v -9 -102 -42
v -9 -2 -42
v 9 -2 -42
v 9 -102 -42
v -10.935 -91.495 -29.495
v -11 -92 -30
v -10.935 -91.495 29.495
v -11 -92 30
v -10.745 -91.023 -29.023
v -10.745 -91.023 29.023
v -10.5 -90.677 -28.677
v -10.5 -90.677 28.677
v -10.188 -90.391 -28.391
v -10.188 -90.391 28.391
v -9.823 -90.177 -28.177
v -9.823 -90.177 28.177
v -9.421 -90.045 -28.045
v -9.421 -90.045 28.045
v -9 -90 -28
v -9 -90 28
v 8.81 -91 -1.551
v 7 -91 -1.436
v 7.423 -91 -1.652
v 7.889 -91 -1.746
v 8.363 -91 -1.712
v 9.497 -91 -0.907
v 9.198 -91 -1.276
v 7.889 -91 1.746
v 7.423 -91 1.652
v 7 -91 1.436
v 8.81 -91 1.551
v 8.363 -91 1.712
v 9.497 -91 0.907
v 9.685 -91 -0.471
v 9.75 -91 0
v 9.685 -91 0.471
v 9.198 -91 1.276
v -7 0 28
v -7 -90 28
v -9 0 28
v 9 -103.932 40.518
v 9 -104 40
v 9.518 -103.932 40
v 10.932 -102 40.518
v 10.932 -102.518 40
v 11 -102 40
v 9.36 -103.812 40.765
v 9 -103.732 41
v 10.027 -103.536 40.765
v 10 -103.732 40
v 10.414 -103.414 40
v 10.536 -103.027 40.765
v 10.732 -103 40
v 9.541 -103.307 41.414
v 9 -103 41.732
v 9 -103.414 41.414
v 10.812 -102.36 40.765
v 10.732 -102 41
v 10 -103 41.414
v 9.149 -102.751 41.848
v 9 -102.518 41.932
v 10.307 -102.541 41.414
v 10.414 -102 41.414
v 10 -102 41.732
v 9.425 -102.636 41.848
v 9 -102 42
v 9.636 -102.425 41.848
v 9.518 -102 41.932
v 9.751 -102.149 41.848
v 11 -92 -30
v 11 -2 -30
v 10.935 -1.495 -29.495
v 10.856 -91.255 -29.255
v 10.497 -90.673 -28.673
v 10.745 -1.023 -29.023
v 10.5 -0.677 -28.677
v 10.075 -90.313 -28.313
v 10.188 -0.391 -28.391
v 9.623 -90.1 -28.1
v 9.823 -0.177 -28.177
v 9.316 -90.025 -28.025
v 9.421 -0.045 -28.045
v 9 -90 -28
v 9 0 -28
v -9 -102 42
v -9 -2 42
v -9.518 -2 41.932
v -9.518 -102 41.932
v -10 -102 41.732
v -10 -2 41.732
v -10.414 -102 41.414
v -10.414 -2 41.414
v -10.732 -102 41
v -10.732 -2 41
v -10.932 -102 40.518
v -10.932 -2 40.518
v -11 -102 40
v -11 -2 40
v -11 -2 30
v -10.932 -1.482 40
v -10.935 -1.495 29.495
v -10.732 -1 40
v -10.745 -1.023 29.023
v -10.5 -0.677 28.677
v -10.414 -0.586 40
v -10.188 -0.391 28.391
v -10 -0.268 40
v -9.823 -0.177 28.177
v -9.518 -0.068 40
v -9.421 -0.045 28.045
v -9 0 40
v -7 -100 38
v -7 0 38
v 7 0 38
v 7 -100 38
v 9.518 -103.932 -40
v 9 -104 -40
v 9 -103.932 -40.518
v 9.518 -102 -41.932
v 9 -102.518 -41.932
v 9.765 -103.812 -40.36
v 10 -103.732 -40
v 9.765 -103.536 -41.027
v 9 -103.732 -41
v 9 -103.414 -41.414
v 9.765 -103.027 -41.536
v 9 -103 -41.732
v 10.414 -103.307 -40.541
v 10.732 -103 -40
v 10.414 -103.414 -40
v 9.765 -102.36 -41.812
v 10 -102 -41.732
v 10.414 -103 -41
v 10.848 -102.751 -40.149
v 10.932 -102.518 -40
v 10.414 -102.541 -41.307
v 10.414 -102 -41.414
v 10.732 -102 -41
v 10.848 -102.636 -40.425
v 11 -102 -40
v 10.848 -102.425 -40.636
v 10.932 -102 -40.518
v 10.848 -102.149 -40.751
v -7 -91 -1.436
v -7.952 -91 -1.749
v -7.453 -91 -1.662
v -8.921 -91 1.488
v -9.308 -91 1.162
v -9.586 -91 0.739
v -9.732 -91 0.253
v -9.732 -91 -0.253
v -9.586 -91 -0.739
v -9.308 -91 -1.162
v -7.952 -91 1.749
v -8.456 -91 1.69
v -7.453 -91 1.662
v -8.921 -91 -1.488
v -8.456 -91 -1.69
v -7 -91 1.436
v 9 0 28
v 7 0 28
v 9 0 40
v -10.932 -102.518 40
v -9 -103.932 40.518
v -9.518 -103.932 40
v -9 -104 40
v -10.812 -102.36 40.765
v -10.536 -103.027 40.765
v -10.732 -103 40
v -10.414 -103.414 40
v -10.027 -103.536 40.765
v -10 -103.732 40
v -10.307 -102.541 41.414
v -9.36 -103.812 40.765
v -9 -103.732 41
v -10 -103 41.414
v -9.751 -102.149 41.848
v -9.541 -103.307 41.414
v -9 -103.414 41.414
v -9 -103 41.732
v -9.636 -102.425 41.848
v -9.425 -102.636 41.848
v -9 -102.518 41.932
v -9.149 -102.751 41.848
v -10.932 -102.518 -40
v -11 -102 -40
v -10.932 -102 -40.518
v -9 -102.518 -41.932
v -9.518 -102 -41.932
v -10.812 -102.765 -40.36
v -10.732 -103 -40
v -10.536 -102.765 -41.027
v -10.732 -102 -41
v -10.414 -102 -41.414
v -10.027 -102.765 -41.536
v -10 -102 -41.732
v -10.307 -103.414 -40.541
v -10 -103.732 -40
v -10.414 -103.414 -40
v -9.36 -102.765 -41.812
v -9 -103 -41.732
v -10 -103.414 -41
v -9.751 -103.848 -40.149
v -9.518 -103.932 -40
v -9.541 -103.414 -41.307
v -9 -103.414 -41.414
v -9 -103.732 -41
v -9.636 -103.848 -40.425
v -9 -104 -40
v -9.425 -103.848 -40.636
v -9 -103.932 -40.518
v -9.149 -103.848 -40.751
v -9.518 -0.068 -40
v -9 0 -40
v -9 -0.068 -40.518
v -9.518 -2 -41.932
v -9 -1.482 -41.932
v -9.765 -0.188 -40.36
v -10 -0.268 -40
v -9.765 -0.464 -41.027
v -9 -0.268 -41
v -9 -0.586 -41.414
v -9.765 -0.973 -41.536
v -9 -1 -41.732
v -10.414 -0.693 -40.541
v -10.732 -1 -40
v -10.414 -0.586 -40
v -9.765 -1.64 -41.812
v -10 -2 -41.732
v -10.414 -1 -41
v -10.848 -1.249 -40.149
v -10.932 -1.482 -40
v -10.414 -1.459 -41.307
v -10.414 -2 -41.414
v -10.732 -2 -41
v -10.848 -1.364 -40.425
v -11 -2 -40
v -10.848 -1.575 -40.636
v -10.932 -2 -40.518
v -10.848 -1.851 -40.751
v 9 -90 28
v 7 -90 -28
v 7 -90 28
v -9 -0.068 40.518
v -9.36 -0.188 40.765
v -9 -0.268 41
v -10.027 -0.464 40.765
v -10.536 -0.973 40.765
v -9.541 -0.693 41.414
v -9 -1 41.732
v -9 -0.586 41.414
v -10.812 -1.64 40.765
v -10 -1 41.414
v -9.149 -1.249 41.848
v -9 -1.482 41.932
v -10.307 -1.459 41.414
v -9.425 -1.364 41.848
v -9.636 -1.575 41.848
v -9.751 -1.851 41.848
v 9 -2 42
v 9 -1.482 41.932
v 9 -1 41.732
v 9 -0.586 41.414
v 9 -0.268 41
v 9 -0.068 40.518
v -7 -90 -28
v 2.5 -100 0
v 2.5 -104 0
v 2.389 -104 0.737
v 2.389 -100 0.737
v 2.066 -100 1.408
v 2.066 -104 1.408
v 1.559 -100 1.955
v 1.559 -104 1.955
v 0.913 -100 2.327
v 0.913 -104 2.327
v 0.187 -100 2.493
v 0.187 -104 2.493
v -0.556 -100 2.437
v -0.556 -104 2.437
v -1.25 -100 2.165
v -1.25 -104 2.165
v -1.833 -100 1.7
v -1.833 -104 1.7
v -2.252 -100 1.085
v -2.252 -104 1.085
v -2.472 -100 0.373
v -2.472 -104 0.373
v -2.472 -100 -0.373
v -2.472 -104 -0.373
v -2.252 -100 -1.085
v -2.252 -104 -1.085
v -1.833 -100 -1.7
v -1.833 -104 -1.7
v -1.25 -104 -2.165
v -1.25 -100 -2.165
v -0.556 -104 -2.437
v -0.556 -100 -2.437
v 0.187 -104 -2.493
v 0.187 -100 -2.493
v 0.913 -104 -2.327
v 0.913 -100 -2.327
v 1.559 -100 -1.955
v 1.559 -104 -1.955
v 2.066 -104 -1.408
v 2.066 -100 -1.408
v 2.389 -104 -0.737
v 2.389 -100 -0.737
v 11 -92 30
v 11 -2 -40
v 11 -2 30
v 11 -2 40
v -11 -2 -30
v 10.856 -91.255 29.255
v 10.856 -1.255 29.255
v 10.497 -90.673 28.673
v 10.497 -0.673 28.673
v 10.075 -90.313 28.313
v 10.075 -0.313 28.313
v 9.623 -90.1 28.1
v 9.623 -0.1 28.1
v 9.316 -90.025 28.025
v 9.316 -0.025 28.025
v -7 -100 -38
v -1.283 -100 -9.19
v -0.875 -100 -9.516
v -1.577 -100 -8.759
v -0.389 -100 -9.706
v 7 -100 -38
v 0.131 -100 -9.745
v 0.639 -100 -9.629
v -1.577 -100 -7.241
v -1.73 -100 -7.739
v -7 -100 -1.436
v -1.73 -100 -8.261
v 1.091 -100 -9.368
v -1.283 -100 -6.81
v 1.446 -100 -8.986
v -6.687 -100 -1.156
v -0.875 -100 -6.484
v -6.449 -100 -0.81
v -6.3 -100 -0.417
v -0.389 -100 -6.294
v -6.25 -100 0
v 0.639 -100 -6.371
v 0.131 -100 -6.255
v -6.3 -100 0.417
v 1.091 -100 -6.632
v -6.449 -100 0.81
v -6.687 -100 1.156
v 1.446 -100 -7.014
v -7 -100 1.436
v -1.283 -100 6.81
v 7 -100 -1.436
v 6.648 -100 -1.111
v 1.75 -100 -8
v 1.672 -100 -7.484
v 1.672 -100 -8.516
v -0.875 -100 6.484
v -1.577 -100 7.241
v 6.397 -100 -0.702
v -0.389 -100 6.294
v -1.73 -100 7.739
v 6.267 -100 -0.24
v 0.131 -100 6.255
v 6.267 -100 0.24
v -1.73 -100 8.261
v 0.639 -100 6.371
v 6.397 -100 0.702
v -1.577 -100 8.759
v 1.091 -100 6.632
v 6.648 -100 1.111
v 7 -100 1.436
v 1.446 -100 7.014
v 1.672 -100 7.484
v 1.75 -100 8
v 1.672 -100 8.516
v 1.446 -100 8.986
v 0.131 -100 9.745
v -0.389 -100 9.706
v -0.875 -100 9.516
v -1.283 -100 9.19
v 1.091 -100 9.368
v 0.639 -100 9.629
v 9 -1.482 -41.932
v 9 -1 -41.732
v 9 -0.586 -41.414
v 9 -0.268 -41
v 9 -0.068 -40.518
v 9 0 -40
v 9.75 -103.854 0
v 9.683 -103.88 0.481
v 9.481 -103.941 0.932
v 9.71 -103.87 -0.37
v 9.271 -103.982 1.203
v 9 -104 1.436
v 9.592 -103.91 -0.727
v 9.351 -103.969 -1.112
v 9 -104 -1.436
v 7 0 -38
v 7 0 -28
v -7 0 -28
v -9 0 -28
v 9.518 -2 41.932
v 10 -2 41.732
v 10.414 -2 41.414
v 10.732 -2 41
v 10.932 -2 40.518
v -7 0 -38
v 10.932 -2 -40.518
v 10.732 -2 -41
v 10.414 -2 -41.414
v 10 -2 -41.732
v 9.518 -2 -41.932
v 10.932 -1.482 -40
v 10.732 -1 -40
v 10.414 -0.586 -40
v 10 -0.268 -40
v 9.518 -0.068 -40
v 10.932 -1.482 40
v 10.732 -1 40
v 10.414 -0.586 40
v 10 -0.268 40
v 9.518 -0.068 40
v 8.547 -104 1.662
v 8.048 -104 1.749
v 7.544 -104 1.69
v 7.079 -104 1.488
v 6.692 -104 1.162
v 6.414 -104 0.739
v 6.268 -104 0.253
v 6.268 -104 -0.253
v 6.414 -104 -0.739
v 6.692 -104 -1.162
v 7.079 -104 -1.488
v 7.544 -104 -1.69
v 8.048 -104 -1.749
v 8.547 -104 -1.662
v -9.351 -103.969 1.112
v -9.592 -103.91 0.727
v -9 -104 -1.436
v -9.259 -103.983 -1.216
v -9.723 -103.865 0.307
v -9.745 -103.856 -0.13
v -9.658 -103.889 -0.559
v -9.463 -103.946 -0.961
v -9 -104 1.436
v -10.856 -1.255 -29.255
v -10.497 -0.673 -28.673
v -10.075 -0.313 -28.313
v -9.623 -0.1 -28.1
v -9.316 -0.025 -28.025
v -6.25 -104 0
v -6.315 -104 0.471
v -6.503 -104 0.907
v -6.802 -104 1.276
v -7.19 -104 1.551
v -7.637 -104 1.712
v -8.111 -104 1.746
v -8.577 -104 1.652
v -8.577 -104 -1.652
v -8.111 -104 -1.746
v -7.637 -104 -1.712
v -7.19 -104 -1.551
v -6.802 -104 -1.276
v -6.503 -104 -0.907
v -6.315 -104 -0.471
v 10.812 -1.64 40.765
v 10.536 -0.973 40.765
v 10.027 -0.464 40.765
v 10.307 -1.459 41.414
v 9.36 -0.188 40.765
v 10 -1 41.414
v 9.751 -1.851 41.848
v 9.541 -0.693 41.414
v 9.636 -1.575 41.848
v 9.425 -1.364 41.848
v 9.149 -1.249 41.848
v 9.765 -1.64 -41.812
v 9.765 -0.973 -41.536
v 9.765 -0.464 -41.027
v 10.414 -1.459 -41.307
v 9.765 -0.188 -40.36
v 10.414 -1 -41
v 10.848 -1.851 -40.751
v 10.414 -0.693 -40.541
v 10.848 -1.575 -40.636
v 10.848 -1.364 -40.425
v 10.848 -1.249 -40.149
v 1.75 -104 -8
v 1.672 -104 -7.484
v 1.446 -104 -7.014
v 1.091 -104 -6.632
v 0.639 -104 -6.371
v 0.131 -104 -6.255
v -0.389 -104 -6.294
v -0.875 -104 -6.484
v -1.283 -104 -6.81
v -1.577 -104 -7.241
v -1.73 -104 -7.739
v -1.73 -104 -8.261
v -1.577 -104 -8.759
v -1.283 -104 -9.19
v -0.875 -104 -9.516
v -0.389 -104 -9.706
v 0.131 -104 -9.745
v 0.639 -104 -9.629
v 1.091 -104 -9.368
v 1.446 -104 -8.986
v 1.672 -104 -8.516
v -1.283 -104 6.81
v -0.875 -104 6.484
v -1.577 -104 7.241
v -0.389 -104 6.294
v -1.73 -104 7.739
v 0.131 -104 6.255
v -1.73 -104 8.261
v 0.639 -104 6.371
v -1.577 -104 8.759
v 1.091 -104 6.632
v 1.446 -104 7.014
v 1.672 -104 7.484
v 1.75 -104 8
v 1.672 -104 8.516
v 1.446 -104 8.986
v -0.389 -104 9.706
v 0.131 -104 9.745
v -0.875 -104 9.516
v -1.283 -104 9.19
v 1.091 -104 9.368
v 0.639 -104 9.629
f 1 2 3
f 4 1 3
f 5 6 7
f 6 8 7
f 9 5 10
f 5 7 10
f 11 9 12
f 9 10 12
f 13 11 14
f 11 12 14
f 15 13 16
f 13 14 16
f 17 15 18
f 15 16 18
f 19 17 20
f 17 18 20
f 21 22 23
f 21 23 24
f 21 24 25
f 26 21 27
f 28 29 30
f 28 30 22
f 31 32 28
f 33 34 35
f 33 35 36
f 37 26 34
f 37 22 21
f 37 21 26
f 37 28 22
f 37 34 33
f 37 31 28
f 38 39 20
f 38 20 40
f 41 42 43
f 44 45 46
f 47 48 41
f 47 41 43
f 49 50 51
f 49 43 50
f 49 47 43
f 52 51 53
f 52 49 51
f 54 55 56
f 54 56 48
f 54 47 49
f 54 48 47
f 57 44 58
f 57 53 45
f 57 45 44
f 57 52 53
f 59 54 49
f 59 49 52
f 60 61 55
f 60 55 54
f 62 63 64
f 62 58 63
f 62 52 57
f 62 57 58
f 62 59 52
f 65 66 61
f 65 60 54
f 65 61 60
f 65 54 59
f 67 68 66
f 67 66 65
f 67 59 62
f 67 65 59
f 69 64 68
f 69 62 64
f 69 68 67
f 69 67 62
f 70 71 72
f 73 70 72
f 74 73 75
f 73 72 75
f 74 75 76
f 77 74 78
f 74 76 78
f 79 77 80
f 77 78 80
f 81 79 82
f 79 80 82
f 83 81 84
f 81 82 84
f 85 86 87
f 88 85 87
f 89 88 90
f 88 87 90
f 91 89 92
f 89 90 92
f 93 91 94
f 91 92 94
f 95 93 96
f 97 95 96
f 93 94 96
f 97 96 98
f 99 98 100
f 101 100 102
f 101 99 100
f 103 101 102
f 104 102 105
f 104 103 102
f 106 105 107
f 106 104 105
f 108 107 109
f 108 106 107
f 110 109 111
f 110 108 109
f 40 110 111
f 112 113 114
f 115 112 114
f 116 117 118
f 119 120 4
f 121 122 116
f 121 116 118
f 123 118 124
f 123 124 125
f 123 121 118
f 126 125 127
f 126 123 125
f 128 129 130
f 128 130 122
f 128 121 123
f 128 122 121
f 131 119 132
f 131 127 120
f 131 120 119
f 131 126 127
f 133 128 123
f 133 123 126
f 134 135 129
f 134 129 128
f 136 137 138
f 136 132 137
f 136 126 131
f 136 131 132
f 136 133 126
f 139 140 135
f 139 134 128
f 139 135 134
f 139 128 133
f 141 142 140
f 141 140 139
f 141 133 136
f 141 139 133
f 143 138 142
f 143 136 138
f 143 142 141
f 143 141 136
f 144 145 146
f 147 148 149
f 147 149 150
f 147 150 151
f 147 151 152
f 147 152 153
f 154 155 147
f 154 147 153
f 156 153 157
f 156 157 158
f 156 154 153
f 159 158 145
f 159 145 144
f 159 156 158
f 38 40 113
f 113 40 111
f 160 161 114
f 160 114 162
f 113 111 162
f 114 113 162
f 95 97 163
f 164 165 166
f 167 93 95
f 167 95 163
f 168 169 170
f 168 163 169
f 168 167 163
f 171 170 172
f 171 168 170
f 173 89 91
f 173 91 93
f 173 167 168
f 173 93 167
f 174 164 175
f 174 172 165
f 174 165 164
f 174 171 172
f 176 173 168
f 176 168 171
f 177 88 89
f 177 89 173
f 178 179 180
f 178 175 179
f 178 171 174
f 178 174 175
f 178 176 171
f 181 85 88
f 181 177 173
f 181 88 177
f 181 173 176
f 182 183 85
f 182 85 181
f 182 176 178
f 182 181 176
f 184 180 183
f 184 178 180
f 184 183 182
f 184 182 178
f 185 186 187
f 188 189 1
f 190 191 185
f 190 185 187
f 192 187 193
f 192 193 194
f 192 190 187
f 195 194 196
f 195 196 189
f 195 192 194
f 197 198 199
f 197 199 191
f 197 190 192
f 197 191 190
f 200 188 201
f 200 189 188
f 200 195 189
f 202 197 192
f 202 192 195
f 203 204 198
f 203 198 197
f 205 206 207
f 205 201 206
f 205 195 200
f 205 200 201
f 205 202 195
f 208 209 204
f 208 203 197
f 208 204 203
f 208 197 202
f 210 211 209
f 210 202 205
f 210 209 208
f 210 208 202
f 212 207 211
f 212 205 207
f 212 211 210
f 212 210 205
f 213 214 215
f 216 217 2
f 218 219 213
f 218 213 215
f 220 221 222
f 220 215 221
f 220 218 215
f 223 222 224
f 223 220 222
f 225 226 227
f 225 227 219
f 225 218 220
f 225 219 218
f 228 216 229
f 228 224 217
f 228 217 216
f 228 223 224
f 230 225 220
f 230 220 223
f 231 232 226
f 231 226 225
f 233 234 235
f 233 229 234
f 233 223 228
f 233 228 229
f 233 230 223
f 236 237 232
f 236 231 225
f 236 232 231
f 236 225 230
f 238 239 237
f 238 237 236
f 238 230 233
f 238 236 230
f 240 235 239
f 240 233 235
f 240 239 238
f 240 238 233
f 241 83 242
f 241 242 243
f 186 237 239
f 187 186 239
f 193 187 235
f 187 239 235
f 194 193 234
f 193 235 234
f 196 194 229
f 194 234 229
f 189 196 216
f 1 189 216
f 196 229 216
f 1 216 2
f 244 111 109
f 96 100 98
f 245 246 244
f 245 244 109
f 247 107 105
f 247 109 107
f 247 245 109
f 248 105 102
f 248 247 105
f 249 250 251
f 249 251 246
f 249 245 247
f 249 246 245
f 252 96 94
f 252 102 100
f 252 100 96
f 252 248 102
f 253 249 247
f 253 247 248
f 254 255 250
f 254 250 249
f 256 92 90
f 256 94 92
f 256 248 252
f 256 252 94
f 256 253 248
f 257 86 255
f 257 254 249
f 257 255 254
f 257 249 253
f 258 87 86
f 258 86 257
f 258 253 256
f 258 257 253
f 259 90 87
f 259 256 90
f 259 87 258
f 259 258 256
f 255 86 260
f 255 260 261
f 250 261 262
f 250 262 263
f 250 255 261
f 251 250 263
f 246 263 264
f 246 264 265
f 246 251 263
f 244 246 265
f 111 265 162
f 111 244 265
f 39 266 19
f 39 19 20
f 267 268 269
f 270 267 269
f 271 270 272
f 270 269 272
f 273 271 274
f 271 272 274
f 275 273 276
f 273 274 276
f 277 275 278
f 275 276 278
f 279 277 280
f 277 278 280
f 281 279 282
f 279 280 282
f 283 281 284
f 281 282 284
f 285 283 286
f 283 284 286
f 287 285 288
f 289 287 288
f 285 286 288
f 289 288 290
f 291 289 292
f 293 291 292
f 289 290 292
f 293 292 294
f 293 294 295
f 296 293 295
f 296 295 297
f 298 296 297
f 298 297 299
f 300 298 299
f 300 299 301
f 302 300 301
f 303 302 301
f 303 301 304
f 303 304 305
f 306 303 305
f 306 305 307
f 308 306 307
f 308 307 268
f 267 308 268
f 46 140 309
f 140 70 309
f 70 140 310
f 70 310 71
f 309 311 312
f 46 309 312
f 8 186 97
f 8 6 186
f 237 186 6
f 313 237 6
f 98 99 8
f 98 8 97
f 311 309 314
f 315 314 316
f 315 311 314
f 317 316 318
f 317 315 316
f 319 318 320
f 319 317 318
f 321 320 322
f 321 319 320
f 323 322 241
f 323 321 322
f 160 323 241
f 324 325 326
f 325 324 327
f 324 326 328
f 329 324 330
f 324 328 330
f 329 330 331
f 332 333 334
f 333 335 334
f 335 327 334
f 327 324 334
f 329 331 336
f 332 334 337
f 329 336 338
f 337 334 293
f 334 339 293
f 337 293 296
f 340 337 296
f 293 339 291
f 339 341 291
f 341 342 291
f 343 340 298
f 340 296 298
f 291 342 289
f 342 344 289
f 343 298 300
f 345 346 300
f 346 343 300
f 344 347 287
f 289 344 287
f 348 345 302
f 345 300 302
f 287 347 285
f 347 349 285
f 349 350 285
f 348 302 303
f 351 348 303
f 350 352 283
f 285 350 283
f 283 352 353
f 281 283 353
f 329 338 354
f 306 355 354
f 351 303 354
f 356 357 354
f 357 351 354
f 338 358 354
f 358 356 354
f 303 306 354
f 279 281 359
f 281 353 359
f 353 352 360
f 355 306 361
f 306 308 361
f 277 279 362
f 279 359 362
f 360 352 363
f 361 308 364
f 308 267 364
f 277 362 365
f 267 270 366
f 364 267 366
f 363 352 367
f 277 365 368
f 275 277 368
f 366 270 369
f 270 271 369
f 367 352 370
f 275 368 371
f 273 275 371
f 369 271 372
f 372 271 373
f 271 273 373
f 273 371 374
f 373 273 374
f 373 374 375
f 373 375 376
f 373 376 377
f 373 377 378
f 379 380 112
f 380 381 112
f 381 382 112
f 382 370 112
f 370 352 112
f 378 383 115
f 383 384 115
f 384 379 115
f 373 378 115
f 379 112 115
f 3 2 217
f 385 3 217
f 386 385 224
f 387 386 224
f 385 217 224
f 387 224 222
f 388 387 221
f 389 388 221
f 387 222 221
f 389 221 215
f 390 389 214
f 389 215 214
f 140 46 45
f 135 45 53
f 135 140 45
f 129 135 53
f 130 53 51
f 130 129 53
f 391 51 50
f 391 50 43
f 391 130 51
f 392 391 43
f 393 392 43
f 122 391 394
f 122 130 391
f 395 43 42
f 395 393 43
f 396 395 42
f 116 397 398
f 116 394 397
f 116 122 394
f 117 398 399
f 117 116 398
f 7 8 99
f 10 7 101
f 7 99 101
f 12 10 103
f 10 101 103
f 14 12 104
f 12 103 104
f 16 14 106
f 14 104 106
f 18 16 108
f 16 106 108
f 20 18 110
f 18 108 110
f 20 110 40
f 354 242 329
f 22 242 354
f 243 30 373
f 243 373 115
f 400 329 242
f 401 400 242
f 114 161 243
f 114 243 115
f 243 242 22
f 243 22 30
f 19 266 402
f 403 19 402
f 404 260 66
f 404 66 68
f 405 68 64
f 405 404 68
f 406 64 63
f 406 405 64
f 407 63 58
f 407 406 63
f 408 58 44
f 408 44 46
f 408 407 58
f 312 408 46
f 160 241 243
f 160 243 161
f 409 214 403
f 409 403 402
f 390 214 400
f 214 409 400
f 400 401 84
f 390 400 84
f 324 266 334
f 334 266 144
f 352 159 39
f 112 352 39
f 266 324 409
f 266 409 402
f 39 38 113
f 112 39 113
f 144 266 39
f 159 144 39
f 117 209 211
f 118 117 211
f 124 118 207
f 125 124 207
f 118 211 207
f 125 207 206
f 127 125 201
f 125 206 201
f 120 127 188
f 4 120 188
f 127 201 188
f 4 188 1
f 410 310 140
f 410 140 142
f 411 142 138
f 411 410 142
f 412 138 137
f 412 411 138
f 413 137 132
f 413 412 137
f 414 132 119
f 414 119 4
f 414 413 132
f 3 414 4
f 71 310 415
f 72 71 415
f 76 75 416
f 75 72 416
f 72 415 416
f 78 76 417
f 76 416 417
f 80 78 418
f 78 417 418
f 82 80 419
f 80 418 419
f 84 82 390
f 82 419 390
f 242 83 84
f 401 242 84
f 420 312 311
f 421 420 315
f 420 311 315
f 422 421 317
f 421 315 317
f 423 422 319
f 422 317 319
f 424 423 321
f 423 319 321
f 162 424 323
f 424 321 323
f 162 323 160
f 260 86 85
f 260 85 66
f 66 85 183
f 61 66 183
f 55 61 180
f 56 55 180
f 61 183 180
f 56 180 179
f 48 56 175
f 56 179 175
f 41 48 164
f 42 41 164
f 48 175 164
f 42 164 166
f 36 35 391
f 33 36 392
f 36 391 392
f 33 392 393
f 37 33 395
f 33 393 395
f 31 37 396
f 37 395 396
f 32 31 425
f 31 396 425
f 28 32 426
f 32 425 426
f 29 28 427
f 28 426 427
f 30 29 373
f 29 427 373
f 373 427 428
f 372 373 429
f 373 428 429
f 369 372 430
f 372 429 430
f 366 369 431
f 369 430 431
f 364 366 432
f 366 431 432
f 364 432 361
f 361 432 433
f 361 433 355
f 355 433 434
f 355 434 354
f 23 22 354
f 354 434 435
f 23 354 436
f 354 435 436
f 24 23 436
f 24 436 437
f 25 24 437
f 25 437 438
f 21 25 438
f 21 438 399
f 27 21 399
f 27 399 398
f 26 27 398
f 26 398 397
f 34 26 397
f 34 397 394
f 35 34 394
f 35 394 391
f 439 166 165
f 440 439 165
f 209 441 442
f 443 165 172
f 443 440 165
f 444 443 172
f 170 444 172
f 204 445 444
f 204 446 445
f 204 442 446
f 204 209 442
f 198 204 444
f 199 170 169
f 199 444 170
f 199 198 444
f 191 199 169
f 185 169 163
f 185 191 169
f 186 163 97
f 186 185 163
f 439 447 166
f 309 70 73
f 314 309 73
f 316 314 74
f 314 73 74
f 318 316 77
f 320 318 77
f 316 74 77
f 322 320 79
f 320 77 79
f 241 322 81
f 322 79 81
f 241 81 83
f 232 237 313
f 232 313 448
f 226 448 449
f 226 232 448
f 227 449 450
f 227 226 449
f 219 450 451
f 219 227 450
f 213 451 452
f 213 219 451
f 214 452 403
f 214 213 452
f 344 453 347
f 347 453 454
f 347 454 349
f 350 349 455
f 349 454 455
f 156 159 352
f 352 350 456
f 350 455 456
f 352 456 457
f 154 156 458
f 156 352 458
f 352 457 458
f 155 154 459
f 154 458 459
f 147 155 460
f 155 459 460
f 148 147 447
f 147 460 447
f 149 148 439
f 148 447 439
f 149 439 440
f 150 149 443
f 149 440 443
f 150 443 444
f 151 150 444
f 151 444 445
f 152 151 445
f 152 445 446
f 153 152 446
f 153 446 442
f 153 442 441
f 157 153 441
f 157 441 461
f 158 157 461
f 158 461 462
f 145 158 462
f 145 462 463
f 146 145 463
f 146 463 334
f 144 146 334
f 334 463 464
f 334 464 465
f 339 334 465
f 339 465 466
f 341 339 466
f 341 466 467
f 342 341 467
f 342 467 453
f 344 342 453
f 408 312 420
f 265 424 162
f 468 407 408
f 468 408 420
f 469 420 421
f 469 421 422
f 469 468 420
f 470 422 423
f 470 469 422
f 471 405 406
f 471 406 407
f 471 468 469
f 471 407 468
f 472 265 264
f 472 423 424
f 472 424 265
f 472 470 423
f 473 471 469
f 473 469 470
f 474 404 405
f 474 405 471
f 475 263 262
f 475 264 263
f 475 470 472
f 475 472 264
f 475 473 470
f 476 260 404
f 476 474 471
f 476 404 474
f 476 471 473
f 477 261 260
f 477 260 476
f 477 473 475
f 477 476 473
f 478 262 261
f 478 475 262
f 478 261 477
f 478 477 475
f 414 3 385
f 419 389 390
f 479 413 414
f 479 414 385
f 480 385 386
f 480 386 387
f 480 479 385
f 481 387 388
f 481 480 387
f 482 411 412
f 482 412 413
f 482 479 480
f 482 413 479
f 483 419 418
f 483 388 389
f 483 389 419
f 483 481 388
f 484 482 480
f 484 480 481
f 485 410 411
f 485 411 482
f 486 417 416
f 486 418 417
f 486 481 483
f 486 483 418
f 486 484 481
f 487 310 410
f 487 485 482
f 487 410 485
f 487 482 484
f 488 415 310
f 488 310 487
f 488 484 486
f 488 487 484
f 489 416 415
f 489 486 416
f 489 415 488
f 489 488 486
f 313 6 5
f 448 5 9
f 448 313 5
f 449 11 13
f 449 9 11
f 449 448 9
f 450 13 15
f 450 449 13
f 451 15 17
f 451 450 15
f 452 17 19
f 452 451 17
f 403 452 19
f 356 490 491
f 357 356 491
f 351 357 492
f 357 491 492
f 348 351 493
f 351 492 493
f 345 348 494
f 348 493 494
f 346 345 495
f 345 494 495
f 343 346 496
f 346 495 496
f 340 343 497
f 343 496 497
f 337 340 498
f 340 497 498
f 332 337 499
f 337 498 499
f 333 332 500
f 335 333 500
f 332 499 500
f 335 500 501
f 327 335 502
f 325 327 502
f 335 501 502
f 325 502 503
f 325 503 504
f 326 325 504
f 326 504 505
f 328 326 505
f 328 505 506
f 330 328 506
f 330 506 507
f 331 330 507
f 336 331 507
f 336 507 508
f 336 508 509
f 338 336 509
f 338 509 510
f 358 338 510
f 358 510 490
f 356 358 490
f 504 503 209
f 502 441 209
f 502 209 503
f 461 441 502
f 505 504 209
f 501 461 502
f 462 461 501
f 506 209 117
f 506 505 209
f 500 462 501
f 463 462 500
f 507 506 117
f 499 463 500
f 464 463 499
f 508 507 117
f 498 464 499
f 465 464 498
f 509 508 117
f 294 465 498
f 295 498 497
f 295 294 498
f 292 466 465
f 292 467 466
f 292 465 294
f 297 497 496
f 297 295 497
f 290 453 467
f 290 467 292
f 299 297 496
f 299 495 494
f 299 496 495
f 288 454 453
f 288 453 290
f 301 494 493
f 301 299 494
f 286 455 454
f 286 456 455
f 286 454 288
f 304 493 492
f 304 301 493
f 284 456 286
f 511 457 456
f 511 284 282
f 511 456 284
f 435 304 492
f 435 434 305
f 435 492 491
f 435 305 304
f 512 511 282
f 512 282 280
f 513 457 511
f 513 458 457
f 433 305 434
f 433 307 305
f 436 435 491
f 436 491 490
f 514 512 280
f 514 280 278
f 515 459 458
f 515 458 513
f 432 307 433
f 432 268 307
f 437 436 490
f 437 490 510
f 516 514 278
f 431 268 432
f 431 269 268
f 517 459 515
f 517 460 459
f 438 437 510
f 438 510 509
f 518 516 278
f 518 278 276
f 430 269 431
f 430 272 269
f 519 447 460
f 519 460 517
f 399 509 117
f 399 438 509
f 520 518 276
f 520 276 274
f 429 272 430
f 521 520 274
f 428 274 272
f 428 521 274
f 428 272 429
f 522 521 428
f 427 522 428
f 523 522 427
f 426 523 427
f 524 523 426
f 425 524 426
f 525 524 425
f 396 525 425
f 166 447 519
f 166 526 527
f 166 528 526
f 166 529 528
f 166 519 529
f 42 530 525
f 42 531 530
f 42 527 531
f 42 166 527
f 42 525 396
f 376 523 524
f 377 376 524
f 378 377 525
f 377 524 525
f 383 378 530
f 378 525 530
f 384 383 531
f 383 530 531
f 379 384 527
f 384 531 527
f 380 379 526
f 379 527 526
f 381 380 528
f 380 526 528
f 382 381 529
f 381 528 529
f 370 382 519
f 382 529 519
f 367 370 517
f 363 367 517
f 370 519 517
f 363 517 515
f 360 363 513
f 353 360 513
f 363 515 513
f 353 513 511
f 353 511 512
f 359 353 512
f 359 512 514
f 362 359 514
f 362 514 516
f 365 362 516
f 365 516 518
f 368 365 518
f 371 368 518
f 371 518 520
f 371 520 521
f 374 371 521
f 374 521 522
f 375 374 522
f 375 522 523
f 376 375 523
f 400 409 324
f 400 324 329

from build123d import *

# Parameters (mm, degrees)
F0_W          = 22
F0_H          = 84
F0_W_2        = 14
F0_H_2        = 76
F1_DEPTH      = 100
F2_W          = 22
F2_H          = 84
F3_DEPTH      = 4
F4_R          = 2.5
F4_R_2        = 1.75
F5_DEPTH      = 13
F6_W          = 90
F6_H          = 56
F7_DEPTH      = 22.001
F8_T1_DEPTH   = 100
F8_T3_DEPTH   = 17
F8_T5_DEPTH   = 95
F8_T7_DEPTH   = 56
F8_T9_DEPTH   = 17
F8_T11_DEPTH  = 80
F8_T13_DEPTH  = 18
F8_S17_W      = 2
F8_S17_H      = 2
F8_T18_DEPTH  = 2
F8_S23_W      = 2
F8_S23_H      = 2
F8_T24_DEPTH  = 2
F8_S29_W      = 2
F8_S29_H      = 2
F8_T30_DEPTH  = 2
F8_S35_W      = 2
F8_S35_H      = 2
F8_T36_DEPTH  = 2
F8_S41_W      = 2
F8_S41_H      = 2
F8_T42_DEPTH  = 2
F8_S47_W      = 2
F8_S47_H      = 2
F8_T48_DEPTH  = 2
F8_S53_W      = 2
F8_S53_H      = 2
F8_T54_DEPTH  = 2
F8_S59_W      = 2
F8_S59_H      = 2
F8_T60_DEPTH  = 2
F8_T67_DEPTH  = 100
F8_T71_DEPTH  = 61
F8_T78_DEPTH  = 61
F8_T82_DEPTH  = 100
F8_T89_DEPTH  = 100
F8_T93_DEPTH  = 61
F8_T100_DEPTH = 61
F8_T104_DEPTH = 100


# Not quite as in the source:
# - a fillet or chamfer that OpenCascade refuses, or shapes differently, is made with other operations: its cross-section is extruded or revolved along the edge and cut away or added


with BuildPart() as f1:
    # F0 (on Front) → F1 (new body)
    with BuildSketch(Plane.XZ):
        Rectangle(F0_W, F0_H)
        Rectangle(F0_W_2, F0_H_2, mode=Mode.SUBTRACT)
    extrude(amount=F1_DEPTH)

    # F2 (on face) → F3 (join)
    with BuildSketch(Plane.XZ.offset(100)):
        Rectangle(F2_W, F2_H)
    extrude(amount=F3_DEPTH)

    # F4 (on face) → F5 (cut)
    with BuildSketch(Plane.XZ.offset(104)):
        Circle(F4_R)
        with Locations((0, 8)):
            Circle(F4_R_2)
        with Locations((-8, 0)):
            Circle(F4_R_2)
        with Locations((0, -8)):
            Circle(F4_R_2)
        with Locations((8, 0)):
            Circle(F4_R_2)
    extrude(amount=-F5_DEPTH, mode=Mode.SUBTRACT)

    # F6 (on face) → F7 (cut, through all)
    with BuildSketch(Plane.YZ.offset(11)):
        with Locations((-45, 0)):
            Rectangle(F6_W, F6_H)
    extrude(amount=-F7_DEPTH, mode=Mode.SUBTRACT)

    # F8: fillet of radius 2 on 20 edges, made by hand

    # F8_s2 → F8_t1 (cut)
    with BuildSketch(Plane.XZ.offset(2)):
        with BuildLine():
            ThreePointArc((11, -40), (10.4142135624, -41.4142135624), (9, -42))
            Line((9, -42), (11, -42))
            Line((11, -42), (11, -40))
        make_face()
        with BuildLine():
            ThreePointArc((9, 42), (10.4142135624, 41.4142135624), (11, 40))
            Line((11, 40), (11, 42))
            Line((11, 42), (9, 42))
        make_face()
        with BuildLine():
            ThreePointArc((-11, -40), (-10.4142135624, -41.4142135624), (-9, -42))
            Line((-9, -42), (-11, -42))
            Line((-11, -42), (-11, -40))
        make_face()
        with BuildLine():
            ThreePointArc((-9, 42), (-10.4142135624, 41.4142135624), (-11, 40))
            Line((-11, 40), (-11, 42))
            Line((-11, 42), (-9, 42))
        make_face()
    extrude(amount=F8_T1_DEPTH, mode=Mode.SUBTRACT)

    # F8_s4 → F8_t3 (cut)
    with BuildSketch(Plane.XY.offset(-40)):
        with BuildLine():
            ThreePointArc((11, -2), (10.4142135624, -0.5857864376), (9, 0))
            Line((9, 0), (11, 0))
            Line((11, 0), (11, -2))
        make_face()
        with BuildLine():
            ThreePointArc((-11, -2), (-10.4142135624, -0.5857864376), (-9, 0))
            Line((-9, 0), (-11, 0))
            Line((-11, 0), (-11, -2))
        make_face()
    extrude(amount=F8_T3_DEPTH, mode=Mode.SUBTRACT)

    # F8_s6 → F8_t5 (cut)
    with BuildSketch(Plane.XZ.offset(-5)):
        with BuildLine():
            ThreePointArc((11, -30), (10.4142135624, -28.5857864376), (9, -28))
            Line((9, -28), (11, -28))
            Line((11, -28), (11, -30))
        make_face()
        with BuildLine():
            ThreePointArc((11, 30), (10.4142135624, 28.5857864376), (9, 28))
            Line((9, 28), (11, 28))
            Line((11, 28), (11, 30))
        make_face()
        with BuildLine():
            ThreePointArc((-11, 30), (-10.4142135624, 28.5857864376), (-9, 28))
            Line((-9, 28), (-11, 28))
            Line((-11, 28), (-11, 30))
        make_face()
        with BuildLine():
            ThreePointArc((-11, -30), (-10.4142135624, -28.5857864376), (-9, -28))
            Line((-9, -28), (-11, -28))
            Line((-11, -28), (-11, -30))
        make_face()
    extrude(amount=F8_T5_DEPTH, mode=Mode.SUBTRACT)

    # F8_s8 → F8_t7 (cut)
    with BuildSketch(Plane.XY.offset(-28)):
        with BuildLine():
            ThreePointArc((11, -92), (10.4142135624, -90.5857864376), (9, -90))
            Line((9, -90), (11, -90))
            Line((11, -90), (11, -92))
        make_face()
        with BuildLine():
            ThreePointArc((-11, -92), (-10.4142135624, -90.5857864376), (-9, -90))
            Line((-9, -90), (-11, -90))
            Line((-11, -90), (-11, -92))
        make_face()
    extrude(amount=F8_T7_DEPTH, mode=Mode.SUBTRACT)

    # F8_s10 → F8_t9 (cut)
    with BuildSketch(Plane.XY.offset(23)):
        with BuildLine():
            ThreePointArc((11, -2), (10.4142135624, -0.5857864376), (9, 0))
            Line((9, 0), (11, 0))
            Line((11, 0), (11, -2))
        make_face()
        with BuildLine():
            ThreePointArc((-11, -2), (-10.4142135624, -0.5857864376), (-9, 0))
            Line((-9, 0), (-11, 0))
            Line((-11, 0), (-11, -2))
        make_face()
    extrude(amount=F8_T9_DEPTH, mode=Mode.SUBTRACT)

    # F8_s12 → F8_t11 (cut)
    with BuildSketch(Plane.XY.offset(-40)):
        with BuildLine():
            ThreePointArc((11, -102), (10.4142135624, -103.4142135624), (9, -104))
            Line((9, -104), (11, -104))
            Line((11, -104), (11, -102))
        make_face()
        with BuildLine():
            ThreePointArc((-9, -104), (-10.4142135624, -103.4142135624), (-11, -102))
            Line((-11, -102), (-11, -104))
            Line((-11, -104), (-9, -104))
        make_face()
    extrude(amount=F8_T11_DEPTH, mode=Mode.SUBTRACT)

    # F8_s14 → F8_t13 (cut)
    with BuildSketch(Plane.YZ.offset(-9)):
        with BuildLine():
            ThreePointArc((-102, 42), (-103.4142135624, 41.4142135624), (-104, 40))
            Line((-104, 40), (-104, 42))
            Line((-104, 42), (-102, 42))
        make_face()
        with BuildLine():
            ThreePointArc((-2, 42), (-0.5857864376, 41.4142135624), (0, 40))
            Line((0, 40), (0, 42))
            Line((0, 42), (-2, 42))
        make_face()
        with BuildLine():
            ThreePointArc((-104, -40), (-103.4142135624, -41.4142135624), (-102, -42))
            Line((-102, -42), (-104, -42))
            Line((-104, -42), (-104, -40))
        make_face()
        with BuildLine():
            ThreePointArc((-2, -42), (-0.5857864376, -41.4142135624), (0, -40))
            Line((0, -40), (0, -42))
            Line((0, -42), (-2, -42))
        make_face()
    extrude(amount=F8_T13_DEPTH, mode=Mode.SUBTRACT)


with BuildPart() as f8_tool16:
    # F8_s17 → F8_t18 (new body)
    with BuildSketch(Plane.YZ.offset(9)):
        with Locations((-103, -41)):
            Rectangle(F8_S17_W, F8_S17_H)
    extrude(amount=F8_T18_DEPTH)

    # F8_s19 → F8_t20 (revolve, cut)
    with BuildSketch(Plane(origin=(9, -102, -40), x_dir=(0, 0.7071067812, 0.7071067812), z_dir=(0, 0.7071067812, -0.7071067812))):
        with BuildLine():
            ThreePointArc((0, -2), (2, 0), (0, 2))
            Line((0, 2), (0, -2))
        make_face()
    revolve(axis=Axis((9, -102, -40), (1, 0, 0)), mode=Mode.SUBTRACT)


with BuildPart() as f1_1:
    add(f1.part)

    # F8_t15: cut F8_tool16
    add(f8_tool16.part, mode=Mode.SUBTRACT)


with BuildPart() as f8_tool22:
    # F8_s23 → F8_t24 (new body)
    with BuildSketch(Plane.YZ.offset(9)):
        with Locations((-1, -41)):
            Rectangle(F8_S23_W, F8_S23_H)
    extrude(amount=F8_T24_DEPTH)

    # F8_s25 → F8_t26 (revolve, cut)
    with BuildSketch(Plane(origin=(9, -2, -40), x_dir=(0, -0.7071067812, 0.7071067812), z_dir=(0, 0.7071067812, 0.7071067812))):
        with BuildLine():
            ThreePointArc((0, -2), (2, 0), (0, 2))
            Line((0, 2), (0, -2))
        make_face()
    revolve(axis=Axis((9, -2, -40), (1, 0, 0)), mode=Mode.SUBTRACT)


with BuildPart() as f1_2:
    add(f1_1.part)

    # F8_t21: cut F8_tool22
    add(f8_tool22.part, mode=Mode.SUBTRACT)


with BuildPart() as f8_tool28:
    # F8_s29 → F8_t30 (new body)
    with BuildSketch(Plane.XY.offset(40)):
        with Locations((10, -1)):
            Rectangle(F8_S29_W, F8_S29_H)
    extrude(amount=F8_T30_DEPTH)

    # F8_s31 → F8_t32 (revolve, cut)
    with BuildSketch(Plane(origin=(9, -2, 40), x_dir=(-0.7071067812, -0.7071067812, 0), z_dir=(-0.7071067812, 0.7071067812, 0))):
        with BuildLine():
            ThreePointArc((0, -2), (2, 0), (0, 2))
            Line((0, 2), (0, -2))
        make_face()
    revolve(axis=Axis((9, -2, 40), (0, 0, 1)), mode=Mode.SUBTRACT)


with BuildPart() as f1_3:
    add(f1_2.part)

    # F8_t27: cut F8_tool28
    add(f8_tool28.part, mode=Mode.SUBTRACT)


with BuildPart() as f8_tool34:
    # F8_s35 → F8_t36 (new body)
    with BuildSketch(Plane.XY.offset(40)):
        with Locations((10, -103)):
            Rectangle(F8_S35_W, F8_S35_H)
    extrude(amount=F8_T36_DEPTH)

    # F8_s37 → F8_t38 (revolve, cut)
    with BuildSketch(Plane(origin=(9, -102, 40), x_dir=(-0.7071067812, 0.7071067812, 0), z_dir=(0.7071067812, 0.7071067812, 0))):
        with BuildLine():
            ThreePointArc((0, -2), (2, 0), (0, 2))
            Line((0, 2), (0, -2))
        make_face()
    revolve(axis=Axis((9, -102, 40), (0, 0, 1)), mode=Mode.SUBTRACT)


with BuildPart() as f1_4:
    add(f1_3.part)

    # F8_t33: cut F8_tool34
    add(f8_tool34.part, mode=Mode.SUBTRACT)


with BuildPart() as f8_tool40:
    # F8_s41 → F8_t42 (new body)
    with BuildSketch(Plane.XY.offset(40)):
        with Locations((-10, -1)):
            Rectangle(F8_S41_W, F8_S41_H)
    extrude(amount=F8_T42_DEPTH)

    # F8_s43 → F8_t44 (revolve, cut)
    with BuildSketch(Plane(origin=(-9, -2, 40), x_dir=(0.7071067812, -0.7071067812, 0), z_dir=(-0.7071067812, -0.7071067812, 0))):
        with BuildLine():
            ThreePointArc((0, -2), (2, 0), (0, 2))
            Line((0, 2), (0, -2))
        make_face()
    revolve(axis=Axis((-9, -2, 40), (0, 0, 1)), mode=Mode.SUBTRACT)


with BuildPart() as f1_5:
    add(f1_4.part)

    # F8_t39: cut F8_tool40
    add(f8_tool40.part, mode=Mode.SUBTRACT)


with BuildPart() as f8_tool46:
    # F8_s47 → F8_t48 (new body)
    with BuildSketch(Plane.YZ.offset(-9)):
        with Locations((-1, -41)):
            Rectangle(F8_S47_W, F8_S47_H)
    extrude(amount=-F8_T48_DEPTH)

    # F8_s49 → F8_t50 (revolve, cut)
    with BuildSketch(Plane(origin=(-9, -2, -40), x_dir=(0, -0.7071067812, 0.7071067812), z_dir=(0, -0.7071067812, -0.7071067812))):
        with BuildLine():
            ThreePointArc((0, -2), (2, 0), (0, 2))
            Line((0, 2), (0, -2))
        make_face()
    revolve(axis=Axis((-9, -2, -40), (-1, 0, 0)), mode=Mode.SUBTRACT)


with BuildPart() as f1_6:
    add(f1_5.part)

    # F8_t45: cut F8_tool46
    add(f8_tool46.part, mode=Mode.SUBTRACT)


with BuildPart() as f8_tool52:
    # F8_s53 → F8_t54 (new body)
    with BuildSketch(Plane.XZ.offset(102)):
        with Locations((-10, -41)):
            Rectangle(F8_S53_W, F8_S53_H)
    extrude(amount=F8_T54_DEPTH)

    # F8_s55 → F8_t56 (revolve, cut)
    with BuildSketch(Plane(origin=(-9, -102, -40), x_dir=(0.7071067812, 0, 0.7071067812), z_dir=(0.7071067812, 0, -0.7071067812))):
        with BuildLine():
            ThreePointArc((0, -2), (2, 0), (0, 2))
            Line((0, 2), (0, -2))
        make_face()
    revolve(axis=Axis((-9, -102, -40), (0, -1, 0)), mode=Mode.SUBTRACT)


with BuildPart() as f1_7:
    add(f1_6.part)

    # F8_t51: cut F8_tool52
    add(f8_tool52.part, mode=Mode.SUBTRACT)


with BuildPart() as f8_tool58:
    # F8_s59 → F8_t60 (new body)
    with BuildSketch(Plane.XY.offset(40)):
        with Locations((-10, -103)):
            Rectangle(F8_S59_W, F8_S59_H)
    extrude(amount=F8_T60_DEPTH)

    # F8_s61 → F8_t62 (revolve, cut)
    with BuildSketch(Plane(origin=(-9, -102, 40), x_dir=(0.7071067812, 0.7071067812, 0), z_dir=(0.7071067812, -0.7071067812, 0))):
        with BuildLine():
            ThreePointArc((0, -2), (2, 0), (0, 2))
            Line((0, 2), (0, -2))
        make_face()
    revolve(axis=Axis((-9, -102, 40), (0, 0, 1)), mode=Mode.SUBTRACT)


with BuildPart() as f1_8:
    add(f1_7.part)

    # F8_t57: cut F8_tool58
    add(f8_tool58.part, mode=Mode.SUBTRACT)


with BuildPart() as f8_tool65:
    # F8_s66 → F8_t67 (new body)
    with BuildSketch(Plane.XZ.offset(95)):
        with BuildLine():
            ThreePointArc((11, -30), (10.4142135624, -28.5857864376), (9, -28))
            Line((9, -28), (11, -28))
            Line((11, -28), (11, -30))
        make_face()
    extrude(amount=-F8_T67_DEPTH)

    split(bisect_by=Plane.XZ.offset(90), keep=Keep.TOP)


with BuildPart() as f8_tool69:
    # F8_s70 → F8_t71 (new body)
    with BuildSketch(Plane.XY.offset(28)):
        with BuildLine():
            ThreePointArc((11, -92), (10.4142135624, -90.5857864376), (9, -90))
            Line((9, -90), (11, -90))
            Line((11, -90), (11, -92))
        make_face()
    extrude(amount=-F8_T71_DEPTH)

    split(bisect_by=Plane.XY.offset(-28), keep=Keep.BOTTOM)


with BuildPart() as f8_tool65_1:
    add(f8_tool65.part)

    # F8_t73: intersect F8_tool69
    add(f8_tool69.part, mode=Mode.INTERSECT)


with BuildPart() as f1_9:
    add(f1_8.part)

    # F8_t63: cut F8_tool65
    add(f8_tool65_1.part, mode=Mode.SUBTRACT)


with BuildPart() as f8_tool76:
    # F8_s77 → F8_t78 (new body)
    with BuildSketch(Plane.XY.offset(33)):
        with BuildLine():
            ThreePointArc((11, -92), (10.4142135624, -90.5857864376), (9, -90))
            Line((9, -90), (11, -90))
            Line((11, -90), (11, -92))
        make_face()
    extrude(amount=-F8_T78_DEPTH)

    split(bisect_by=Plane.XY.offset(28), keep=Keep.TOP)


with BuildPart() as f8_tool80:
    # F8_s81 → F8_t82 (new body)
    with BuildSketch(Plane.XZ.offset(-5)):
        with BuildLine():
            ThreePointArc((11, 30), (10.4142135624, 28.5857864376), (9, 28))
            Line((9, 28), (11, 28))
            Line((11, 28), (11, 30))
        make_face()
    extrude(amount=F8_T82_DEPTH)

    split(bisect_by=Plane.XZ.offset(90), keep=Keep.TOP)


with BuildPart() as f8_tool76_1:
    add(f8_tool76.part)

    # F8_t84: intersect F8_tool80
    add(f8_tool80.part, mode=Mode.INTERSECT)


with BuildPart() as f1_10:
    add(f1_9.part)

    # F8_t74: cut F8_tool76
    add(f8_tool76_1.part, mode=Mode.SUBTRACT)


with BuildPart() as f8_tool87:
    # F8_s88 → F8_t89 (new body)
    with BuildSketch(Plane.XZ.offset(-5)):
        with BuildLine():
            ThreePointArc((-11, 30), (-10.4142135624, 28.5857864376), (-9, 28))
            Line((-9, 28), (-11, 28))
            Line((-11, 28), (-11, 30))
        make_face()
    extrude(amount=F8_T89_DEPTH)

    split(bisect_by=Plane.XZ.offset(90), keep=Keep.TOP)


with BuildPart() as f8_tool91:
    # F8_s92 → F8_t93 (new body)
    with BuildSketch(Plane.XY.offset(33)):
        with BuildLine():
            ThreePointArc((-11, -92), (-10.4142135624, -90.5857864376), (-9, -90))
            Line((-9, -90), (-11, -90))
            Line((-11, -90), (-11, -92))
        make_face()
    extrude(amount=-F8_T93_DEPTH)

    split(bisect_by=Plane.XY.offset(28), keep=Keep.TOP)


with BuildPart() as f8_tool87_1:
    add(f8_tool87.part)

    # F8_t95: intersect F8_tool91
    add(f8_tool91.part, mode=Mode.INTERSECT)


with BuildPart() as f1_11:
    add(f1_10.part)

    # F8_t85: cut F8_tool87
    add(f8_tool87_1.part, mode=Mode.SUBTRACT)


with BuildPart() as f8_tool98:
    # F8_s99 → F8_t100 (new body)
    with BuildSketch(Plane.XY.offset(28)):
        with BuildLine():
            ThreePointArc((-11, -92), (-10.4142135624, -90.5857864376), (-9, -90))
            Line((-9, -90), (-11, -90))
            Line((-11, -90), (-11, -92))
        make_face()
    extrude(amount=-F8_T100_DEPTH)

    split(bisect_by=Plane.XY.offset(-28), keep=Keep.BOTTOM)


with BuildPart() as f8_tool102:
    # F8_s103 → F8_t104 (new body)
    with BuildSketch(Plane.XZ.offset(95)):
        with BuildLine():
            ThreePointArc((-11, -30), (-10.4142135624, -28.5857864376), (-9, -28))
            Line((-9, -28), (-11, -28))
            Line((-11, -28), (-11, -30))
        make_face()
    extrude(amount=-F8_T104_DEPTH)

    split(bisect_by=Plane.XZ.offset(90), keep=Keep.TOP)


with BuildPart() as f8_tool98_1:
    add(f8_tool98.part)

    # F8_t106: intersect F8_tool102
    add(f8_tool102.part, mode=Mode.INTERSECT)


with BuildPart() as f1_12:
    add(f1_11.part)

    # F8_t96: cut F8_tool98
    add(f8_tool98_1.part, mode=Mode.SUBTRACT)


solid = f1_12.part
